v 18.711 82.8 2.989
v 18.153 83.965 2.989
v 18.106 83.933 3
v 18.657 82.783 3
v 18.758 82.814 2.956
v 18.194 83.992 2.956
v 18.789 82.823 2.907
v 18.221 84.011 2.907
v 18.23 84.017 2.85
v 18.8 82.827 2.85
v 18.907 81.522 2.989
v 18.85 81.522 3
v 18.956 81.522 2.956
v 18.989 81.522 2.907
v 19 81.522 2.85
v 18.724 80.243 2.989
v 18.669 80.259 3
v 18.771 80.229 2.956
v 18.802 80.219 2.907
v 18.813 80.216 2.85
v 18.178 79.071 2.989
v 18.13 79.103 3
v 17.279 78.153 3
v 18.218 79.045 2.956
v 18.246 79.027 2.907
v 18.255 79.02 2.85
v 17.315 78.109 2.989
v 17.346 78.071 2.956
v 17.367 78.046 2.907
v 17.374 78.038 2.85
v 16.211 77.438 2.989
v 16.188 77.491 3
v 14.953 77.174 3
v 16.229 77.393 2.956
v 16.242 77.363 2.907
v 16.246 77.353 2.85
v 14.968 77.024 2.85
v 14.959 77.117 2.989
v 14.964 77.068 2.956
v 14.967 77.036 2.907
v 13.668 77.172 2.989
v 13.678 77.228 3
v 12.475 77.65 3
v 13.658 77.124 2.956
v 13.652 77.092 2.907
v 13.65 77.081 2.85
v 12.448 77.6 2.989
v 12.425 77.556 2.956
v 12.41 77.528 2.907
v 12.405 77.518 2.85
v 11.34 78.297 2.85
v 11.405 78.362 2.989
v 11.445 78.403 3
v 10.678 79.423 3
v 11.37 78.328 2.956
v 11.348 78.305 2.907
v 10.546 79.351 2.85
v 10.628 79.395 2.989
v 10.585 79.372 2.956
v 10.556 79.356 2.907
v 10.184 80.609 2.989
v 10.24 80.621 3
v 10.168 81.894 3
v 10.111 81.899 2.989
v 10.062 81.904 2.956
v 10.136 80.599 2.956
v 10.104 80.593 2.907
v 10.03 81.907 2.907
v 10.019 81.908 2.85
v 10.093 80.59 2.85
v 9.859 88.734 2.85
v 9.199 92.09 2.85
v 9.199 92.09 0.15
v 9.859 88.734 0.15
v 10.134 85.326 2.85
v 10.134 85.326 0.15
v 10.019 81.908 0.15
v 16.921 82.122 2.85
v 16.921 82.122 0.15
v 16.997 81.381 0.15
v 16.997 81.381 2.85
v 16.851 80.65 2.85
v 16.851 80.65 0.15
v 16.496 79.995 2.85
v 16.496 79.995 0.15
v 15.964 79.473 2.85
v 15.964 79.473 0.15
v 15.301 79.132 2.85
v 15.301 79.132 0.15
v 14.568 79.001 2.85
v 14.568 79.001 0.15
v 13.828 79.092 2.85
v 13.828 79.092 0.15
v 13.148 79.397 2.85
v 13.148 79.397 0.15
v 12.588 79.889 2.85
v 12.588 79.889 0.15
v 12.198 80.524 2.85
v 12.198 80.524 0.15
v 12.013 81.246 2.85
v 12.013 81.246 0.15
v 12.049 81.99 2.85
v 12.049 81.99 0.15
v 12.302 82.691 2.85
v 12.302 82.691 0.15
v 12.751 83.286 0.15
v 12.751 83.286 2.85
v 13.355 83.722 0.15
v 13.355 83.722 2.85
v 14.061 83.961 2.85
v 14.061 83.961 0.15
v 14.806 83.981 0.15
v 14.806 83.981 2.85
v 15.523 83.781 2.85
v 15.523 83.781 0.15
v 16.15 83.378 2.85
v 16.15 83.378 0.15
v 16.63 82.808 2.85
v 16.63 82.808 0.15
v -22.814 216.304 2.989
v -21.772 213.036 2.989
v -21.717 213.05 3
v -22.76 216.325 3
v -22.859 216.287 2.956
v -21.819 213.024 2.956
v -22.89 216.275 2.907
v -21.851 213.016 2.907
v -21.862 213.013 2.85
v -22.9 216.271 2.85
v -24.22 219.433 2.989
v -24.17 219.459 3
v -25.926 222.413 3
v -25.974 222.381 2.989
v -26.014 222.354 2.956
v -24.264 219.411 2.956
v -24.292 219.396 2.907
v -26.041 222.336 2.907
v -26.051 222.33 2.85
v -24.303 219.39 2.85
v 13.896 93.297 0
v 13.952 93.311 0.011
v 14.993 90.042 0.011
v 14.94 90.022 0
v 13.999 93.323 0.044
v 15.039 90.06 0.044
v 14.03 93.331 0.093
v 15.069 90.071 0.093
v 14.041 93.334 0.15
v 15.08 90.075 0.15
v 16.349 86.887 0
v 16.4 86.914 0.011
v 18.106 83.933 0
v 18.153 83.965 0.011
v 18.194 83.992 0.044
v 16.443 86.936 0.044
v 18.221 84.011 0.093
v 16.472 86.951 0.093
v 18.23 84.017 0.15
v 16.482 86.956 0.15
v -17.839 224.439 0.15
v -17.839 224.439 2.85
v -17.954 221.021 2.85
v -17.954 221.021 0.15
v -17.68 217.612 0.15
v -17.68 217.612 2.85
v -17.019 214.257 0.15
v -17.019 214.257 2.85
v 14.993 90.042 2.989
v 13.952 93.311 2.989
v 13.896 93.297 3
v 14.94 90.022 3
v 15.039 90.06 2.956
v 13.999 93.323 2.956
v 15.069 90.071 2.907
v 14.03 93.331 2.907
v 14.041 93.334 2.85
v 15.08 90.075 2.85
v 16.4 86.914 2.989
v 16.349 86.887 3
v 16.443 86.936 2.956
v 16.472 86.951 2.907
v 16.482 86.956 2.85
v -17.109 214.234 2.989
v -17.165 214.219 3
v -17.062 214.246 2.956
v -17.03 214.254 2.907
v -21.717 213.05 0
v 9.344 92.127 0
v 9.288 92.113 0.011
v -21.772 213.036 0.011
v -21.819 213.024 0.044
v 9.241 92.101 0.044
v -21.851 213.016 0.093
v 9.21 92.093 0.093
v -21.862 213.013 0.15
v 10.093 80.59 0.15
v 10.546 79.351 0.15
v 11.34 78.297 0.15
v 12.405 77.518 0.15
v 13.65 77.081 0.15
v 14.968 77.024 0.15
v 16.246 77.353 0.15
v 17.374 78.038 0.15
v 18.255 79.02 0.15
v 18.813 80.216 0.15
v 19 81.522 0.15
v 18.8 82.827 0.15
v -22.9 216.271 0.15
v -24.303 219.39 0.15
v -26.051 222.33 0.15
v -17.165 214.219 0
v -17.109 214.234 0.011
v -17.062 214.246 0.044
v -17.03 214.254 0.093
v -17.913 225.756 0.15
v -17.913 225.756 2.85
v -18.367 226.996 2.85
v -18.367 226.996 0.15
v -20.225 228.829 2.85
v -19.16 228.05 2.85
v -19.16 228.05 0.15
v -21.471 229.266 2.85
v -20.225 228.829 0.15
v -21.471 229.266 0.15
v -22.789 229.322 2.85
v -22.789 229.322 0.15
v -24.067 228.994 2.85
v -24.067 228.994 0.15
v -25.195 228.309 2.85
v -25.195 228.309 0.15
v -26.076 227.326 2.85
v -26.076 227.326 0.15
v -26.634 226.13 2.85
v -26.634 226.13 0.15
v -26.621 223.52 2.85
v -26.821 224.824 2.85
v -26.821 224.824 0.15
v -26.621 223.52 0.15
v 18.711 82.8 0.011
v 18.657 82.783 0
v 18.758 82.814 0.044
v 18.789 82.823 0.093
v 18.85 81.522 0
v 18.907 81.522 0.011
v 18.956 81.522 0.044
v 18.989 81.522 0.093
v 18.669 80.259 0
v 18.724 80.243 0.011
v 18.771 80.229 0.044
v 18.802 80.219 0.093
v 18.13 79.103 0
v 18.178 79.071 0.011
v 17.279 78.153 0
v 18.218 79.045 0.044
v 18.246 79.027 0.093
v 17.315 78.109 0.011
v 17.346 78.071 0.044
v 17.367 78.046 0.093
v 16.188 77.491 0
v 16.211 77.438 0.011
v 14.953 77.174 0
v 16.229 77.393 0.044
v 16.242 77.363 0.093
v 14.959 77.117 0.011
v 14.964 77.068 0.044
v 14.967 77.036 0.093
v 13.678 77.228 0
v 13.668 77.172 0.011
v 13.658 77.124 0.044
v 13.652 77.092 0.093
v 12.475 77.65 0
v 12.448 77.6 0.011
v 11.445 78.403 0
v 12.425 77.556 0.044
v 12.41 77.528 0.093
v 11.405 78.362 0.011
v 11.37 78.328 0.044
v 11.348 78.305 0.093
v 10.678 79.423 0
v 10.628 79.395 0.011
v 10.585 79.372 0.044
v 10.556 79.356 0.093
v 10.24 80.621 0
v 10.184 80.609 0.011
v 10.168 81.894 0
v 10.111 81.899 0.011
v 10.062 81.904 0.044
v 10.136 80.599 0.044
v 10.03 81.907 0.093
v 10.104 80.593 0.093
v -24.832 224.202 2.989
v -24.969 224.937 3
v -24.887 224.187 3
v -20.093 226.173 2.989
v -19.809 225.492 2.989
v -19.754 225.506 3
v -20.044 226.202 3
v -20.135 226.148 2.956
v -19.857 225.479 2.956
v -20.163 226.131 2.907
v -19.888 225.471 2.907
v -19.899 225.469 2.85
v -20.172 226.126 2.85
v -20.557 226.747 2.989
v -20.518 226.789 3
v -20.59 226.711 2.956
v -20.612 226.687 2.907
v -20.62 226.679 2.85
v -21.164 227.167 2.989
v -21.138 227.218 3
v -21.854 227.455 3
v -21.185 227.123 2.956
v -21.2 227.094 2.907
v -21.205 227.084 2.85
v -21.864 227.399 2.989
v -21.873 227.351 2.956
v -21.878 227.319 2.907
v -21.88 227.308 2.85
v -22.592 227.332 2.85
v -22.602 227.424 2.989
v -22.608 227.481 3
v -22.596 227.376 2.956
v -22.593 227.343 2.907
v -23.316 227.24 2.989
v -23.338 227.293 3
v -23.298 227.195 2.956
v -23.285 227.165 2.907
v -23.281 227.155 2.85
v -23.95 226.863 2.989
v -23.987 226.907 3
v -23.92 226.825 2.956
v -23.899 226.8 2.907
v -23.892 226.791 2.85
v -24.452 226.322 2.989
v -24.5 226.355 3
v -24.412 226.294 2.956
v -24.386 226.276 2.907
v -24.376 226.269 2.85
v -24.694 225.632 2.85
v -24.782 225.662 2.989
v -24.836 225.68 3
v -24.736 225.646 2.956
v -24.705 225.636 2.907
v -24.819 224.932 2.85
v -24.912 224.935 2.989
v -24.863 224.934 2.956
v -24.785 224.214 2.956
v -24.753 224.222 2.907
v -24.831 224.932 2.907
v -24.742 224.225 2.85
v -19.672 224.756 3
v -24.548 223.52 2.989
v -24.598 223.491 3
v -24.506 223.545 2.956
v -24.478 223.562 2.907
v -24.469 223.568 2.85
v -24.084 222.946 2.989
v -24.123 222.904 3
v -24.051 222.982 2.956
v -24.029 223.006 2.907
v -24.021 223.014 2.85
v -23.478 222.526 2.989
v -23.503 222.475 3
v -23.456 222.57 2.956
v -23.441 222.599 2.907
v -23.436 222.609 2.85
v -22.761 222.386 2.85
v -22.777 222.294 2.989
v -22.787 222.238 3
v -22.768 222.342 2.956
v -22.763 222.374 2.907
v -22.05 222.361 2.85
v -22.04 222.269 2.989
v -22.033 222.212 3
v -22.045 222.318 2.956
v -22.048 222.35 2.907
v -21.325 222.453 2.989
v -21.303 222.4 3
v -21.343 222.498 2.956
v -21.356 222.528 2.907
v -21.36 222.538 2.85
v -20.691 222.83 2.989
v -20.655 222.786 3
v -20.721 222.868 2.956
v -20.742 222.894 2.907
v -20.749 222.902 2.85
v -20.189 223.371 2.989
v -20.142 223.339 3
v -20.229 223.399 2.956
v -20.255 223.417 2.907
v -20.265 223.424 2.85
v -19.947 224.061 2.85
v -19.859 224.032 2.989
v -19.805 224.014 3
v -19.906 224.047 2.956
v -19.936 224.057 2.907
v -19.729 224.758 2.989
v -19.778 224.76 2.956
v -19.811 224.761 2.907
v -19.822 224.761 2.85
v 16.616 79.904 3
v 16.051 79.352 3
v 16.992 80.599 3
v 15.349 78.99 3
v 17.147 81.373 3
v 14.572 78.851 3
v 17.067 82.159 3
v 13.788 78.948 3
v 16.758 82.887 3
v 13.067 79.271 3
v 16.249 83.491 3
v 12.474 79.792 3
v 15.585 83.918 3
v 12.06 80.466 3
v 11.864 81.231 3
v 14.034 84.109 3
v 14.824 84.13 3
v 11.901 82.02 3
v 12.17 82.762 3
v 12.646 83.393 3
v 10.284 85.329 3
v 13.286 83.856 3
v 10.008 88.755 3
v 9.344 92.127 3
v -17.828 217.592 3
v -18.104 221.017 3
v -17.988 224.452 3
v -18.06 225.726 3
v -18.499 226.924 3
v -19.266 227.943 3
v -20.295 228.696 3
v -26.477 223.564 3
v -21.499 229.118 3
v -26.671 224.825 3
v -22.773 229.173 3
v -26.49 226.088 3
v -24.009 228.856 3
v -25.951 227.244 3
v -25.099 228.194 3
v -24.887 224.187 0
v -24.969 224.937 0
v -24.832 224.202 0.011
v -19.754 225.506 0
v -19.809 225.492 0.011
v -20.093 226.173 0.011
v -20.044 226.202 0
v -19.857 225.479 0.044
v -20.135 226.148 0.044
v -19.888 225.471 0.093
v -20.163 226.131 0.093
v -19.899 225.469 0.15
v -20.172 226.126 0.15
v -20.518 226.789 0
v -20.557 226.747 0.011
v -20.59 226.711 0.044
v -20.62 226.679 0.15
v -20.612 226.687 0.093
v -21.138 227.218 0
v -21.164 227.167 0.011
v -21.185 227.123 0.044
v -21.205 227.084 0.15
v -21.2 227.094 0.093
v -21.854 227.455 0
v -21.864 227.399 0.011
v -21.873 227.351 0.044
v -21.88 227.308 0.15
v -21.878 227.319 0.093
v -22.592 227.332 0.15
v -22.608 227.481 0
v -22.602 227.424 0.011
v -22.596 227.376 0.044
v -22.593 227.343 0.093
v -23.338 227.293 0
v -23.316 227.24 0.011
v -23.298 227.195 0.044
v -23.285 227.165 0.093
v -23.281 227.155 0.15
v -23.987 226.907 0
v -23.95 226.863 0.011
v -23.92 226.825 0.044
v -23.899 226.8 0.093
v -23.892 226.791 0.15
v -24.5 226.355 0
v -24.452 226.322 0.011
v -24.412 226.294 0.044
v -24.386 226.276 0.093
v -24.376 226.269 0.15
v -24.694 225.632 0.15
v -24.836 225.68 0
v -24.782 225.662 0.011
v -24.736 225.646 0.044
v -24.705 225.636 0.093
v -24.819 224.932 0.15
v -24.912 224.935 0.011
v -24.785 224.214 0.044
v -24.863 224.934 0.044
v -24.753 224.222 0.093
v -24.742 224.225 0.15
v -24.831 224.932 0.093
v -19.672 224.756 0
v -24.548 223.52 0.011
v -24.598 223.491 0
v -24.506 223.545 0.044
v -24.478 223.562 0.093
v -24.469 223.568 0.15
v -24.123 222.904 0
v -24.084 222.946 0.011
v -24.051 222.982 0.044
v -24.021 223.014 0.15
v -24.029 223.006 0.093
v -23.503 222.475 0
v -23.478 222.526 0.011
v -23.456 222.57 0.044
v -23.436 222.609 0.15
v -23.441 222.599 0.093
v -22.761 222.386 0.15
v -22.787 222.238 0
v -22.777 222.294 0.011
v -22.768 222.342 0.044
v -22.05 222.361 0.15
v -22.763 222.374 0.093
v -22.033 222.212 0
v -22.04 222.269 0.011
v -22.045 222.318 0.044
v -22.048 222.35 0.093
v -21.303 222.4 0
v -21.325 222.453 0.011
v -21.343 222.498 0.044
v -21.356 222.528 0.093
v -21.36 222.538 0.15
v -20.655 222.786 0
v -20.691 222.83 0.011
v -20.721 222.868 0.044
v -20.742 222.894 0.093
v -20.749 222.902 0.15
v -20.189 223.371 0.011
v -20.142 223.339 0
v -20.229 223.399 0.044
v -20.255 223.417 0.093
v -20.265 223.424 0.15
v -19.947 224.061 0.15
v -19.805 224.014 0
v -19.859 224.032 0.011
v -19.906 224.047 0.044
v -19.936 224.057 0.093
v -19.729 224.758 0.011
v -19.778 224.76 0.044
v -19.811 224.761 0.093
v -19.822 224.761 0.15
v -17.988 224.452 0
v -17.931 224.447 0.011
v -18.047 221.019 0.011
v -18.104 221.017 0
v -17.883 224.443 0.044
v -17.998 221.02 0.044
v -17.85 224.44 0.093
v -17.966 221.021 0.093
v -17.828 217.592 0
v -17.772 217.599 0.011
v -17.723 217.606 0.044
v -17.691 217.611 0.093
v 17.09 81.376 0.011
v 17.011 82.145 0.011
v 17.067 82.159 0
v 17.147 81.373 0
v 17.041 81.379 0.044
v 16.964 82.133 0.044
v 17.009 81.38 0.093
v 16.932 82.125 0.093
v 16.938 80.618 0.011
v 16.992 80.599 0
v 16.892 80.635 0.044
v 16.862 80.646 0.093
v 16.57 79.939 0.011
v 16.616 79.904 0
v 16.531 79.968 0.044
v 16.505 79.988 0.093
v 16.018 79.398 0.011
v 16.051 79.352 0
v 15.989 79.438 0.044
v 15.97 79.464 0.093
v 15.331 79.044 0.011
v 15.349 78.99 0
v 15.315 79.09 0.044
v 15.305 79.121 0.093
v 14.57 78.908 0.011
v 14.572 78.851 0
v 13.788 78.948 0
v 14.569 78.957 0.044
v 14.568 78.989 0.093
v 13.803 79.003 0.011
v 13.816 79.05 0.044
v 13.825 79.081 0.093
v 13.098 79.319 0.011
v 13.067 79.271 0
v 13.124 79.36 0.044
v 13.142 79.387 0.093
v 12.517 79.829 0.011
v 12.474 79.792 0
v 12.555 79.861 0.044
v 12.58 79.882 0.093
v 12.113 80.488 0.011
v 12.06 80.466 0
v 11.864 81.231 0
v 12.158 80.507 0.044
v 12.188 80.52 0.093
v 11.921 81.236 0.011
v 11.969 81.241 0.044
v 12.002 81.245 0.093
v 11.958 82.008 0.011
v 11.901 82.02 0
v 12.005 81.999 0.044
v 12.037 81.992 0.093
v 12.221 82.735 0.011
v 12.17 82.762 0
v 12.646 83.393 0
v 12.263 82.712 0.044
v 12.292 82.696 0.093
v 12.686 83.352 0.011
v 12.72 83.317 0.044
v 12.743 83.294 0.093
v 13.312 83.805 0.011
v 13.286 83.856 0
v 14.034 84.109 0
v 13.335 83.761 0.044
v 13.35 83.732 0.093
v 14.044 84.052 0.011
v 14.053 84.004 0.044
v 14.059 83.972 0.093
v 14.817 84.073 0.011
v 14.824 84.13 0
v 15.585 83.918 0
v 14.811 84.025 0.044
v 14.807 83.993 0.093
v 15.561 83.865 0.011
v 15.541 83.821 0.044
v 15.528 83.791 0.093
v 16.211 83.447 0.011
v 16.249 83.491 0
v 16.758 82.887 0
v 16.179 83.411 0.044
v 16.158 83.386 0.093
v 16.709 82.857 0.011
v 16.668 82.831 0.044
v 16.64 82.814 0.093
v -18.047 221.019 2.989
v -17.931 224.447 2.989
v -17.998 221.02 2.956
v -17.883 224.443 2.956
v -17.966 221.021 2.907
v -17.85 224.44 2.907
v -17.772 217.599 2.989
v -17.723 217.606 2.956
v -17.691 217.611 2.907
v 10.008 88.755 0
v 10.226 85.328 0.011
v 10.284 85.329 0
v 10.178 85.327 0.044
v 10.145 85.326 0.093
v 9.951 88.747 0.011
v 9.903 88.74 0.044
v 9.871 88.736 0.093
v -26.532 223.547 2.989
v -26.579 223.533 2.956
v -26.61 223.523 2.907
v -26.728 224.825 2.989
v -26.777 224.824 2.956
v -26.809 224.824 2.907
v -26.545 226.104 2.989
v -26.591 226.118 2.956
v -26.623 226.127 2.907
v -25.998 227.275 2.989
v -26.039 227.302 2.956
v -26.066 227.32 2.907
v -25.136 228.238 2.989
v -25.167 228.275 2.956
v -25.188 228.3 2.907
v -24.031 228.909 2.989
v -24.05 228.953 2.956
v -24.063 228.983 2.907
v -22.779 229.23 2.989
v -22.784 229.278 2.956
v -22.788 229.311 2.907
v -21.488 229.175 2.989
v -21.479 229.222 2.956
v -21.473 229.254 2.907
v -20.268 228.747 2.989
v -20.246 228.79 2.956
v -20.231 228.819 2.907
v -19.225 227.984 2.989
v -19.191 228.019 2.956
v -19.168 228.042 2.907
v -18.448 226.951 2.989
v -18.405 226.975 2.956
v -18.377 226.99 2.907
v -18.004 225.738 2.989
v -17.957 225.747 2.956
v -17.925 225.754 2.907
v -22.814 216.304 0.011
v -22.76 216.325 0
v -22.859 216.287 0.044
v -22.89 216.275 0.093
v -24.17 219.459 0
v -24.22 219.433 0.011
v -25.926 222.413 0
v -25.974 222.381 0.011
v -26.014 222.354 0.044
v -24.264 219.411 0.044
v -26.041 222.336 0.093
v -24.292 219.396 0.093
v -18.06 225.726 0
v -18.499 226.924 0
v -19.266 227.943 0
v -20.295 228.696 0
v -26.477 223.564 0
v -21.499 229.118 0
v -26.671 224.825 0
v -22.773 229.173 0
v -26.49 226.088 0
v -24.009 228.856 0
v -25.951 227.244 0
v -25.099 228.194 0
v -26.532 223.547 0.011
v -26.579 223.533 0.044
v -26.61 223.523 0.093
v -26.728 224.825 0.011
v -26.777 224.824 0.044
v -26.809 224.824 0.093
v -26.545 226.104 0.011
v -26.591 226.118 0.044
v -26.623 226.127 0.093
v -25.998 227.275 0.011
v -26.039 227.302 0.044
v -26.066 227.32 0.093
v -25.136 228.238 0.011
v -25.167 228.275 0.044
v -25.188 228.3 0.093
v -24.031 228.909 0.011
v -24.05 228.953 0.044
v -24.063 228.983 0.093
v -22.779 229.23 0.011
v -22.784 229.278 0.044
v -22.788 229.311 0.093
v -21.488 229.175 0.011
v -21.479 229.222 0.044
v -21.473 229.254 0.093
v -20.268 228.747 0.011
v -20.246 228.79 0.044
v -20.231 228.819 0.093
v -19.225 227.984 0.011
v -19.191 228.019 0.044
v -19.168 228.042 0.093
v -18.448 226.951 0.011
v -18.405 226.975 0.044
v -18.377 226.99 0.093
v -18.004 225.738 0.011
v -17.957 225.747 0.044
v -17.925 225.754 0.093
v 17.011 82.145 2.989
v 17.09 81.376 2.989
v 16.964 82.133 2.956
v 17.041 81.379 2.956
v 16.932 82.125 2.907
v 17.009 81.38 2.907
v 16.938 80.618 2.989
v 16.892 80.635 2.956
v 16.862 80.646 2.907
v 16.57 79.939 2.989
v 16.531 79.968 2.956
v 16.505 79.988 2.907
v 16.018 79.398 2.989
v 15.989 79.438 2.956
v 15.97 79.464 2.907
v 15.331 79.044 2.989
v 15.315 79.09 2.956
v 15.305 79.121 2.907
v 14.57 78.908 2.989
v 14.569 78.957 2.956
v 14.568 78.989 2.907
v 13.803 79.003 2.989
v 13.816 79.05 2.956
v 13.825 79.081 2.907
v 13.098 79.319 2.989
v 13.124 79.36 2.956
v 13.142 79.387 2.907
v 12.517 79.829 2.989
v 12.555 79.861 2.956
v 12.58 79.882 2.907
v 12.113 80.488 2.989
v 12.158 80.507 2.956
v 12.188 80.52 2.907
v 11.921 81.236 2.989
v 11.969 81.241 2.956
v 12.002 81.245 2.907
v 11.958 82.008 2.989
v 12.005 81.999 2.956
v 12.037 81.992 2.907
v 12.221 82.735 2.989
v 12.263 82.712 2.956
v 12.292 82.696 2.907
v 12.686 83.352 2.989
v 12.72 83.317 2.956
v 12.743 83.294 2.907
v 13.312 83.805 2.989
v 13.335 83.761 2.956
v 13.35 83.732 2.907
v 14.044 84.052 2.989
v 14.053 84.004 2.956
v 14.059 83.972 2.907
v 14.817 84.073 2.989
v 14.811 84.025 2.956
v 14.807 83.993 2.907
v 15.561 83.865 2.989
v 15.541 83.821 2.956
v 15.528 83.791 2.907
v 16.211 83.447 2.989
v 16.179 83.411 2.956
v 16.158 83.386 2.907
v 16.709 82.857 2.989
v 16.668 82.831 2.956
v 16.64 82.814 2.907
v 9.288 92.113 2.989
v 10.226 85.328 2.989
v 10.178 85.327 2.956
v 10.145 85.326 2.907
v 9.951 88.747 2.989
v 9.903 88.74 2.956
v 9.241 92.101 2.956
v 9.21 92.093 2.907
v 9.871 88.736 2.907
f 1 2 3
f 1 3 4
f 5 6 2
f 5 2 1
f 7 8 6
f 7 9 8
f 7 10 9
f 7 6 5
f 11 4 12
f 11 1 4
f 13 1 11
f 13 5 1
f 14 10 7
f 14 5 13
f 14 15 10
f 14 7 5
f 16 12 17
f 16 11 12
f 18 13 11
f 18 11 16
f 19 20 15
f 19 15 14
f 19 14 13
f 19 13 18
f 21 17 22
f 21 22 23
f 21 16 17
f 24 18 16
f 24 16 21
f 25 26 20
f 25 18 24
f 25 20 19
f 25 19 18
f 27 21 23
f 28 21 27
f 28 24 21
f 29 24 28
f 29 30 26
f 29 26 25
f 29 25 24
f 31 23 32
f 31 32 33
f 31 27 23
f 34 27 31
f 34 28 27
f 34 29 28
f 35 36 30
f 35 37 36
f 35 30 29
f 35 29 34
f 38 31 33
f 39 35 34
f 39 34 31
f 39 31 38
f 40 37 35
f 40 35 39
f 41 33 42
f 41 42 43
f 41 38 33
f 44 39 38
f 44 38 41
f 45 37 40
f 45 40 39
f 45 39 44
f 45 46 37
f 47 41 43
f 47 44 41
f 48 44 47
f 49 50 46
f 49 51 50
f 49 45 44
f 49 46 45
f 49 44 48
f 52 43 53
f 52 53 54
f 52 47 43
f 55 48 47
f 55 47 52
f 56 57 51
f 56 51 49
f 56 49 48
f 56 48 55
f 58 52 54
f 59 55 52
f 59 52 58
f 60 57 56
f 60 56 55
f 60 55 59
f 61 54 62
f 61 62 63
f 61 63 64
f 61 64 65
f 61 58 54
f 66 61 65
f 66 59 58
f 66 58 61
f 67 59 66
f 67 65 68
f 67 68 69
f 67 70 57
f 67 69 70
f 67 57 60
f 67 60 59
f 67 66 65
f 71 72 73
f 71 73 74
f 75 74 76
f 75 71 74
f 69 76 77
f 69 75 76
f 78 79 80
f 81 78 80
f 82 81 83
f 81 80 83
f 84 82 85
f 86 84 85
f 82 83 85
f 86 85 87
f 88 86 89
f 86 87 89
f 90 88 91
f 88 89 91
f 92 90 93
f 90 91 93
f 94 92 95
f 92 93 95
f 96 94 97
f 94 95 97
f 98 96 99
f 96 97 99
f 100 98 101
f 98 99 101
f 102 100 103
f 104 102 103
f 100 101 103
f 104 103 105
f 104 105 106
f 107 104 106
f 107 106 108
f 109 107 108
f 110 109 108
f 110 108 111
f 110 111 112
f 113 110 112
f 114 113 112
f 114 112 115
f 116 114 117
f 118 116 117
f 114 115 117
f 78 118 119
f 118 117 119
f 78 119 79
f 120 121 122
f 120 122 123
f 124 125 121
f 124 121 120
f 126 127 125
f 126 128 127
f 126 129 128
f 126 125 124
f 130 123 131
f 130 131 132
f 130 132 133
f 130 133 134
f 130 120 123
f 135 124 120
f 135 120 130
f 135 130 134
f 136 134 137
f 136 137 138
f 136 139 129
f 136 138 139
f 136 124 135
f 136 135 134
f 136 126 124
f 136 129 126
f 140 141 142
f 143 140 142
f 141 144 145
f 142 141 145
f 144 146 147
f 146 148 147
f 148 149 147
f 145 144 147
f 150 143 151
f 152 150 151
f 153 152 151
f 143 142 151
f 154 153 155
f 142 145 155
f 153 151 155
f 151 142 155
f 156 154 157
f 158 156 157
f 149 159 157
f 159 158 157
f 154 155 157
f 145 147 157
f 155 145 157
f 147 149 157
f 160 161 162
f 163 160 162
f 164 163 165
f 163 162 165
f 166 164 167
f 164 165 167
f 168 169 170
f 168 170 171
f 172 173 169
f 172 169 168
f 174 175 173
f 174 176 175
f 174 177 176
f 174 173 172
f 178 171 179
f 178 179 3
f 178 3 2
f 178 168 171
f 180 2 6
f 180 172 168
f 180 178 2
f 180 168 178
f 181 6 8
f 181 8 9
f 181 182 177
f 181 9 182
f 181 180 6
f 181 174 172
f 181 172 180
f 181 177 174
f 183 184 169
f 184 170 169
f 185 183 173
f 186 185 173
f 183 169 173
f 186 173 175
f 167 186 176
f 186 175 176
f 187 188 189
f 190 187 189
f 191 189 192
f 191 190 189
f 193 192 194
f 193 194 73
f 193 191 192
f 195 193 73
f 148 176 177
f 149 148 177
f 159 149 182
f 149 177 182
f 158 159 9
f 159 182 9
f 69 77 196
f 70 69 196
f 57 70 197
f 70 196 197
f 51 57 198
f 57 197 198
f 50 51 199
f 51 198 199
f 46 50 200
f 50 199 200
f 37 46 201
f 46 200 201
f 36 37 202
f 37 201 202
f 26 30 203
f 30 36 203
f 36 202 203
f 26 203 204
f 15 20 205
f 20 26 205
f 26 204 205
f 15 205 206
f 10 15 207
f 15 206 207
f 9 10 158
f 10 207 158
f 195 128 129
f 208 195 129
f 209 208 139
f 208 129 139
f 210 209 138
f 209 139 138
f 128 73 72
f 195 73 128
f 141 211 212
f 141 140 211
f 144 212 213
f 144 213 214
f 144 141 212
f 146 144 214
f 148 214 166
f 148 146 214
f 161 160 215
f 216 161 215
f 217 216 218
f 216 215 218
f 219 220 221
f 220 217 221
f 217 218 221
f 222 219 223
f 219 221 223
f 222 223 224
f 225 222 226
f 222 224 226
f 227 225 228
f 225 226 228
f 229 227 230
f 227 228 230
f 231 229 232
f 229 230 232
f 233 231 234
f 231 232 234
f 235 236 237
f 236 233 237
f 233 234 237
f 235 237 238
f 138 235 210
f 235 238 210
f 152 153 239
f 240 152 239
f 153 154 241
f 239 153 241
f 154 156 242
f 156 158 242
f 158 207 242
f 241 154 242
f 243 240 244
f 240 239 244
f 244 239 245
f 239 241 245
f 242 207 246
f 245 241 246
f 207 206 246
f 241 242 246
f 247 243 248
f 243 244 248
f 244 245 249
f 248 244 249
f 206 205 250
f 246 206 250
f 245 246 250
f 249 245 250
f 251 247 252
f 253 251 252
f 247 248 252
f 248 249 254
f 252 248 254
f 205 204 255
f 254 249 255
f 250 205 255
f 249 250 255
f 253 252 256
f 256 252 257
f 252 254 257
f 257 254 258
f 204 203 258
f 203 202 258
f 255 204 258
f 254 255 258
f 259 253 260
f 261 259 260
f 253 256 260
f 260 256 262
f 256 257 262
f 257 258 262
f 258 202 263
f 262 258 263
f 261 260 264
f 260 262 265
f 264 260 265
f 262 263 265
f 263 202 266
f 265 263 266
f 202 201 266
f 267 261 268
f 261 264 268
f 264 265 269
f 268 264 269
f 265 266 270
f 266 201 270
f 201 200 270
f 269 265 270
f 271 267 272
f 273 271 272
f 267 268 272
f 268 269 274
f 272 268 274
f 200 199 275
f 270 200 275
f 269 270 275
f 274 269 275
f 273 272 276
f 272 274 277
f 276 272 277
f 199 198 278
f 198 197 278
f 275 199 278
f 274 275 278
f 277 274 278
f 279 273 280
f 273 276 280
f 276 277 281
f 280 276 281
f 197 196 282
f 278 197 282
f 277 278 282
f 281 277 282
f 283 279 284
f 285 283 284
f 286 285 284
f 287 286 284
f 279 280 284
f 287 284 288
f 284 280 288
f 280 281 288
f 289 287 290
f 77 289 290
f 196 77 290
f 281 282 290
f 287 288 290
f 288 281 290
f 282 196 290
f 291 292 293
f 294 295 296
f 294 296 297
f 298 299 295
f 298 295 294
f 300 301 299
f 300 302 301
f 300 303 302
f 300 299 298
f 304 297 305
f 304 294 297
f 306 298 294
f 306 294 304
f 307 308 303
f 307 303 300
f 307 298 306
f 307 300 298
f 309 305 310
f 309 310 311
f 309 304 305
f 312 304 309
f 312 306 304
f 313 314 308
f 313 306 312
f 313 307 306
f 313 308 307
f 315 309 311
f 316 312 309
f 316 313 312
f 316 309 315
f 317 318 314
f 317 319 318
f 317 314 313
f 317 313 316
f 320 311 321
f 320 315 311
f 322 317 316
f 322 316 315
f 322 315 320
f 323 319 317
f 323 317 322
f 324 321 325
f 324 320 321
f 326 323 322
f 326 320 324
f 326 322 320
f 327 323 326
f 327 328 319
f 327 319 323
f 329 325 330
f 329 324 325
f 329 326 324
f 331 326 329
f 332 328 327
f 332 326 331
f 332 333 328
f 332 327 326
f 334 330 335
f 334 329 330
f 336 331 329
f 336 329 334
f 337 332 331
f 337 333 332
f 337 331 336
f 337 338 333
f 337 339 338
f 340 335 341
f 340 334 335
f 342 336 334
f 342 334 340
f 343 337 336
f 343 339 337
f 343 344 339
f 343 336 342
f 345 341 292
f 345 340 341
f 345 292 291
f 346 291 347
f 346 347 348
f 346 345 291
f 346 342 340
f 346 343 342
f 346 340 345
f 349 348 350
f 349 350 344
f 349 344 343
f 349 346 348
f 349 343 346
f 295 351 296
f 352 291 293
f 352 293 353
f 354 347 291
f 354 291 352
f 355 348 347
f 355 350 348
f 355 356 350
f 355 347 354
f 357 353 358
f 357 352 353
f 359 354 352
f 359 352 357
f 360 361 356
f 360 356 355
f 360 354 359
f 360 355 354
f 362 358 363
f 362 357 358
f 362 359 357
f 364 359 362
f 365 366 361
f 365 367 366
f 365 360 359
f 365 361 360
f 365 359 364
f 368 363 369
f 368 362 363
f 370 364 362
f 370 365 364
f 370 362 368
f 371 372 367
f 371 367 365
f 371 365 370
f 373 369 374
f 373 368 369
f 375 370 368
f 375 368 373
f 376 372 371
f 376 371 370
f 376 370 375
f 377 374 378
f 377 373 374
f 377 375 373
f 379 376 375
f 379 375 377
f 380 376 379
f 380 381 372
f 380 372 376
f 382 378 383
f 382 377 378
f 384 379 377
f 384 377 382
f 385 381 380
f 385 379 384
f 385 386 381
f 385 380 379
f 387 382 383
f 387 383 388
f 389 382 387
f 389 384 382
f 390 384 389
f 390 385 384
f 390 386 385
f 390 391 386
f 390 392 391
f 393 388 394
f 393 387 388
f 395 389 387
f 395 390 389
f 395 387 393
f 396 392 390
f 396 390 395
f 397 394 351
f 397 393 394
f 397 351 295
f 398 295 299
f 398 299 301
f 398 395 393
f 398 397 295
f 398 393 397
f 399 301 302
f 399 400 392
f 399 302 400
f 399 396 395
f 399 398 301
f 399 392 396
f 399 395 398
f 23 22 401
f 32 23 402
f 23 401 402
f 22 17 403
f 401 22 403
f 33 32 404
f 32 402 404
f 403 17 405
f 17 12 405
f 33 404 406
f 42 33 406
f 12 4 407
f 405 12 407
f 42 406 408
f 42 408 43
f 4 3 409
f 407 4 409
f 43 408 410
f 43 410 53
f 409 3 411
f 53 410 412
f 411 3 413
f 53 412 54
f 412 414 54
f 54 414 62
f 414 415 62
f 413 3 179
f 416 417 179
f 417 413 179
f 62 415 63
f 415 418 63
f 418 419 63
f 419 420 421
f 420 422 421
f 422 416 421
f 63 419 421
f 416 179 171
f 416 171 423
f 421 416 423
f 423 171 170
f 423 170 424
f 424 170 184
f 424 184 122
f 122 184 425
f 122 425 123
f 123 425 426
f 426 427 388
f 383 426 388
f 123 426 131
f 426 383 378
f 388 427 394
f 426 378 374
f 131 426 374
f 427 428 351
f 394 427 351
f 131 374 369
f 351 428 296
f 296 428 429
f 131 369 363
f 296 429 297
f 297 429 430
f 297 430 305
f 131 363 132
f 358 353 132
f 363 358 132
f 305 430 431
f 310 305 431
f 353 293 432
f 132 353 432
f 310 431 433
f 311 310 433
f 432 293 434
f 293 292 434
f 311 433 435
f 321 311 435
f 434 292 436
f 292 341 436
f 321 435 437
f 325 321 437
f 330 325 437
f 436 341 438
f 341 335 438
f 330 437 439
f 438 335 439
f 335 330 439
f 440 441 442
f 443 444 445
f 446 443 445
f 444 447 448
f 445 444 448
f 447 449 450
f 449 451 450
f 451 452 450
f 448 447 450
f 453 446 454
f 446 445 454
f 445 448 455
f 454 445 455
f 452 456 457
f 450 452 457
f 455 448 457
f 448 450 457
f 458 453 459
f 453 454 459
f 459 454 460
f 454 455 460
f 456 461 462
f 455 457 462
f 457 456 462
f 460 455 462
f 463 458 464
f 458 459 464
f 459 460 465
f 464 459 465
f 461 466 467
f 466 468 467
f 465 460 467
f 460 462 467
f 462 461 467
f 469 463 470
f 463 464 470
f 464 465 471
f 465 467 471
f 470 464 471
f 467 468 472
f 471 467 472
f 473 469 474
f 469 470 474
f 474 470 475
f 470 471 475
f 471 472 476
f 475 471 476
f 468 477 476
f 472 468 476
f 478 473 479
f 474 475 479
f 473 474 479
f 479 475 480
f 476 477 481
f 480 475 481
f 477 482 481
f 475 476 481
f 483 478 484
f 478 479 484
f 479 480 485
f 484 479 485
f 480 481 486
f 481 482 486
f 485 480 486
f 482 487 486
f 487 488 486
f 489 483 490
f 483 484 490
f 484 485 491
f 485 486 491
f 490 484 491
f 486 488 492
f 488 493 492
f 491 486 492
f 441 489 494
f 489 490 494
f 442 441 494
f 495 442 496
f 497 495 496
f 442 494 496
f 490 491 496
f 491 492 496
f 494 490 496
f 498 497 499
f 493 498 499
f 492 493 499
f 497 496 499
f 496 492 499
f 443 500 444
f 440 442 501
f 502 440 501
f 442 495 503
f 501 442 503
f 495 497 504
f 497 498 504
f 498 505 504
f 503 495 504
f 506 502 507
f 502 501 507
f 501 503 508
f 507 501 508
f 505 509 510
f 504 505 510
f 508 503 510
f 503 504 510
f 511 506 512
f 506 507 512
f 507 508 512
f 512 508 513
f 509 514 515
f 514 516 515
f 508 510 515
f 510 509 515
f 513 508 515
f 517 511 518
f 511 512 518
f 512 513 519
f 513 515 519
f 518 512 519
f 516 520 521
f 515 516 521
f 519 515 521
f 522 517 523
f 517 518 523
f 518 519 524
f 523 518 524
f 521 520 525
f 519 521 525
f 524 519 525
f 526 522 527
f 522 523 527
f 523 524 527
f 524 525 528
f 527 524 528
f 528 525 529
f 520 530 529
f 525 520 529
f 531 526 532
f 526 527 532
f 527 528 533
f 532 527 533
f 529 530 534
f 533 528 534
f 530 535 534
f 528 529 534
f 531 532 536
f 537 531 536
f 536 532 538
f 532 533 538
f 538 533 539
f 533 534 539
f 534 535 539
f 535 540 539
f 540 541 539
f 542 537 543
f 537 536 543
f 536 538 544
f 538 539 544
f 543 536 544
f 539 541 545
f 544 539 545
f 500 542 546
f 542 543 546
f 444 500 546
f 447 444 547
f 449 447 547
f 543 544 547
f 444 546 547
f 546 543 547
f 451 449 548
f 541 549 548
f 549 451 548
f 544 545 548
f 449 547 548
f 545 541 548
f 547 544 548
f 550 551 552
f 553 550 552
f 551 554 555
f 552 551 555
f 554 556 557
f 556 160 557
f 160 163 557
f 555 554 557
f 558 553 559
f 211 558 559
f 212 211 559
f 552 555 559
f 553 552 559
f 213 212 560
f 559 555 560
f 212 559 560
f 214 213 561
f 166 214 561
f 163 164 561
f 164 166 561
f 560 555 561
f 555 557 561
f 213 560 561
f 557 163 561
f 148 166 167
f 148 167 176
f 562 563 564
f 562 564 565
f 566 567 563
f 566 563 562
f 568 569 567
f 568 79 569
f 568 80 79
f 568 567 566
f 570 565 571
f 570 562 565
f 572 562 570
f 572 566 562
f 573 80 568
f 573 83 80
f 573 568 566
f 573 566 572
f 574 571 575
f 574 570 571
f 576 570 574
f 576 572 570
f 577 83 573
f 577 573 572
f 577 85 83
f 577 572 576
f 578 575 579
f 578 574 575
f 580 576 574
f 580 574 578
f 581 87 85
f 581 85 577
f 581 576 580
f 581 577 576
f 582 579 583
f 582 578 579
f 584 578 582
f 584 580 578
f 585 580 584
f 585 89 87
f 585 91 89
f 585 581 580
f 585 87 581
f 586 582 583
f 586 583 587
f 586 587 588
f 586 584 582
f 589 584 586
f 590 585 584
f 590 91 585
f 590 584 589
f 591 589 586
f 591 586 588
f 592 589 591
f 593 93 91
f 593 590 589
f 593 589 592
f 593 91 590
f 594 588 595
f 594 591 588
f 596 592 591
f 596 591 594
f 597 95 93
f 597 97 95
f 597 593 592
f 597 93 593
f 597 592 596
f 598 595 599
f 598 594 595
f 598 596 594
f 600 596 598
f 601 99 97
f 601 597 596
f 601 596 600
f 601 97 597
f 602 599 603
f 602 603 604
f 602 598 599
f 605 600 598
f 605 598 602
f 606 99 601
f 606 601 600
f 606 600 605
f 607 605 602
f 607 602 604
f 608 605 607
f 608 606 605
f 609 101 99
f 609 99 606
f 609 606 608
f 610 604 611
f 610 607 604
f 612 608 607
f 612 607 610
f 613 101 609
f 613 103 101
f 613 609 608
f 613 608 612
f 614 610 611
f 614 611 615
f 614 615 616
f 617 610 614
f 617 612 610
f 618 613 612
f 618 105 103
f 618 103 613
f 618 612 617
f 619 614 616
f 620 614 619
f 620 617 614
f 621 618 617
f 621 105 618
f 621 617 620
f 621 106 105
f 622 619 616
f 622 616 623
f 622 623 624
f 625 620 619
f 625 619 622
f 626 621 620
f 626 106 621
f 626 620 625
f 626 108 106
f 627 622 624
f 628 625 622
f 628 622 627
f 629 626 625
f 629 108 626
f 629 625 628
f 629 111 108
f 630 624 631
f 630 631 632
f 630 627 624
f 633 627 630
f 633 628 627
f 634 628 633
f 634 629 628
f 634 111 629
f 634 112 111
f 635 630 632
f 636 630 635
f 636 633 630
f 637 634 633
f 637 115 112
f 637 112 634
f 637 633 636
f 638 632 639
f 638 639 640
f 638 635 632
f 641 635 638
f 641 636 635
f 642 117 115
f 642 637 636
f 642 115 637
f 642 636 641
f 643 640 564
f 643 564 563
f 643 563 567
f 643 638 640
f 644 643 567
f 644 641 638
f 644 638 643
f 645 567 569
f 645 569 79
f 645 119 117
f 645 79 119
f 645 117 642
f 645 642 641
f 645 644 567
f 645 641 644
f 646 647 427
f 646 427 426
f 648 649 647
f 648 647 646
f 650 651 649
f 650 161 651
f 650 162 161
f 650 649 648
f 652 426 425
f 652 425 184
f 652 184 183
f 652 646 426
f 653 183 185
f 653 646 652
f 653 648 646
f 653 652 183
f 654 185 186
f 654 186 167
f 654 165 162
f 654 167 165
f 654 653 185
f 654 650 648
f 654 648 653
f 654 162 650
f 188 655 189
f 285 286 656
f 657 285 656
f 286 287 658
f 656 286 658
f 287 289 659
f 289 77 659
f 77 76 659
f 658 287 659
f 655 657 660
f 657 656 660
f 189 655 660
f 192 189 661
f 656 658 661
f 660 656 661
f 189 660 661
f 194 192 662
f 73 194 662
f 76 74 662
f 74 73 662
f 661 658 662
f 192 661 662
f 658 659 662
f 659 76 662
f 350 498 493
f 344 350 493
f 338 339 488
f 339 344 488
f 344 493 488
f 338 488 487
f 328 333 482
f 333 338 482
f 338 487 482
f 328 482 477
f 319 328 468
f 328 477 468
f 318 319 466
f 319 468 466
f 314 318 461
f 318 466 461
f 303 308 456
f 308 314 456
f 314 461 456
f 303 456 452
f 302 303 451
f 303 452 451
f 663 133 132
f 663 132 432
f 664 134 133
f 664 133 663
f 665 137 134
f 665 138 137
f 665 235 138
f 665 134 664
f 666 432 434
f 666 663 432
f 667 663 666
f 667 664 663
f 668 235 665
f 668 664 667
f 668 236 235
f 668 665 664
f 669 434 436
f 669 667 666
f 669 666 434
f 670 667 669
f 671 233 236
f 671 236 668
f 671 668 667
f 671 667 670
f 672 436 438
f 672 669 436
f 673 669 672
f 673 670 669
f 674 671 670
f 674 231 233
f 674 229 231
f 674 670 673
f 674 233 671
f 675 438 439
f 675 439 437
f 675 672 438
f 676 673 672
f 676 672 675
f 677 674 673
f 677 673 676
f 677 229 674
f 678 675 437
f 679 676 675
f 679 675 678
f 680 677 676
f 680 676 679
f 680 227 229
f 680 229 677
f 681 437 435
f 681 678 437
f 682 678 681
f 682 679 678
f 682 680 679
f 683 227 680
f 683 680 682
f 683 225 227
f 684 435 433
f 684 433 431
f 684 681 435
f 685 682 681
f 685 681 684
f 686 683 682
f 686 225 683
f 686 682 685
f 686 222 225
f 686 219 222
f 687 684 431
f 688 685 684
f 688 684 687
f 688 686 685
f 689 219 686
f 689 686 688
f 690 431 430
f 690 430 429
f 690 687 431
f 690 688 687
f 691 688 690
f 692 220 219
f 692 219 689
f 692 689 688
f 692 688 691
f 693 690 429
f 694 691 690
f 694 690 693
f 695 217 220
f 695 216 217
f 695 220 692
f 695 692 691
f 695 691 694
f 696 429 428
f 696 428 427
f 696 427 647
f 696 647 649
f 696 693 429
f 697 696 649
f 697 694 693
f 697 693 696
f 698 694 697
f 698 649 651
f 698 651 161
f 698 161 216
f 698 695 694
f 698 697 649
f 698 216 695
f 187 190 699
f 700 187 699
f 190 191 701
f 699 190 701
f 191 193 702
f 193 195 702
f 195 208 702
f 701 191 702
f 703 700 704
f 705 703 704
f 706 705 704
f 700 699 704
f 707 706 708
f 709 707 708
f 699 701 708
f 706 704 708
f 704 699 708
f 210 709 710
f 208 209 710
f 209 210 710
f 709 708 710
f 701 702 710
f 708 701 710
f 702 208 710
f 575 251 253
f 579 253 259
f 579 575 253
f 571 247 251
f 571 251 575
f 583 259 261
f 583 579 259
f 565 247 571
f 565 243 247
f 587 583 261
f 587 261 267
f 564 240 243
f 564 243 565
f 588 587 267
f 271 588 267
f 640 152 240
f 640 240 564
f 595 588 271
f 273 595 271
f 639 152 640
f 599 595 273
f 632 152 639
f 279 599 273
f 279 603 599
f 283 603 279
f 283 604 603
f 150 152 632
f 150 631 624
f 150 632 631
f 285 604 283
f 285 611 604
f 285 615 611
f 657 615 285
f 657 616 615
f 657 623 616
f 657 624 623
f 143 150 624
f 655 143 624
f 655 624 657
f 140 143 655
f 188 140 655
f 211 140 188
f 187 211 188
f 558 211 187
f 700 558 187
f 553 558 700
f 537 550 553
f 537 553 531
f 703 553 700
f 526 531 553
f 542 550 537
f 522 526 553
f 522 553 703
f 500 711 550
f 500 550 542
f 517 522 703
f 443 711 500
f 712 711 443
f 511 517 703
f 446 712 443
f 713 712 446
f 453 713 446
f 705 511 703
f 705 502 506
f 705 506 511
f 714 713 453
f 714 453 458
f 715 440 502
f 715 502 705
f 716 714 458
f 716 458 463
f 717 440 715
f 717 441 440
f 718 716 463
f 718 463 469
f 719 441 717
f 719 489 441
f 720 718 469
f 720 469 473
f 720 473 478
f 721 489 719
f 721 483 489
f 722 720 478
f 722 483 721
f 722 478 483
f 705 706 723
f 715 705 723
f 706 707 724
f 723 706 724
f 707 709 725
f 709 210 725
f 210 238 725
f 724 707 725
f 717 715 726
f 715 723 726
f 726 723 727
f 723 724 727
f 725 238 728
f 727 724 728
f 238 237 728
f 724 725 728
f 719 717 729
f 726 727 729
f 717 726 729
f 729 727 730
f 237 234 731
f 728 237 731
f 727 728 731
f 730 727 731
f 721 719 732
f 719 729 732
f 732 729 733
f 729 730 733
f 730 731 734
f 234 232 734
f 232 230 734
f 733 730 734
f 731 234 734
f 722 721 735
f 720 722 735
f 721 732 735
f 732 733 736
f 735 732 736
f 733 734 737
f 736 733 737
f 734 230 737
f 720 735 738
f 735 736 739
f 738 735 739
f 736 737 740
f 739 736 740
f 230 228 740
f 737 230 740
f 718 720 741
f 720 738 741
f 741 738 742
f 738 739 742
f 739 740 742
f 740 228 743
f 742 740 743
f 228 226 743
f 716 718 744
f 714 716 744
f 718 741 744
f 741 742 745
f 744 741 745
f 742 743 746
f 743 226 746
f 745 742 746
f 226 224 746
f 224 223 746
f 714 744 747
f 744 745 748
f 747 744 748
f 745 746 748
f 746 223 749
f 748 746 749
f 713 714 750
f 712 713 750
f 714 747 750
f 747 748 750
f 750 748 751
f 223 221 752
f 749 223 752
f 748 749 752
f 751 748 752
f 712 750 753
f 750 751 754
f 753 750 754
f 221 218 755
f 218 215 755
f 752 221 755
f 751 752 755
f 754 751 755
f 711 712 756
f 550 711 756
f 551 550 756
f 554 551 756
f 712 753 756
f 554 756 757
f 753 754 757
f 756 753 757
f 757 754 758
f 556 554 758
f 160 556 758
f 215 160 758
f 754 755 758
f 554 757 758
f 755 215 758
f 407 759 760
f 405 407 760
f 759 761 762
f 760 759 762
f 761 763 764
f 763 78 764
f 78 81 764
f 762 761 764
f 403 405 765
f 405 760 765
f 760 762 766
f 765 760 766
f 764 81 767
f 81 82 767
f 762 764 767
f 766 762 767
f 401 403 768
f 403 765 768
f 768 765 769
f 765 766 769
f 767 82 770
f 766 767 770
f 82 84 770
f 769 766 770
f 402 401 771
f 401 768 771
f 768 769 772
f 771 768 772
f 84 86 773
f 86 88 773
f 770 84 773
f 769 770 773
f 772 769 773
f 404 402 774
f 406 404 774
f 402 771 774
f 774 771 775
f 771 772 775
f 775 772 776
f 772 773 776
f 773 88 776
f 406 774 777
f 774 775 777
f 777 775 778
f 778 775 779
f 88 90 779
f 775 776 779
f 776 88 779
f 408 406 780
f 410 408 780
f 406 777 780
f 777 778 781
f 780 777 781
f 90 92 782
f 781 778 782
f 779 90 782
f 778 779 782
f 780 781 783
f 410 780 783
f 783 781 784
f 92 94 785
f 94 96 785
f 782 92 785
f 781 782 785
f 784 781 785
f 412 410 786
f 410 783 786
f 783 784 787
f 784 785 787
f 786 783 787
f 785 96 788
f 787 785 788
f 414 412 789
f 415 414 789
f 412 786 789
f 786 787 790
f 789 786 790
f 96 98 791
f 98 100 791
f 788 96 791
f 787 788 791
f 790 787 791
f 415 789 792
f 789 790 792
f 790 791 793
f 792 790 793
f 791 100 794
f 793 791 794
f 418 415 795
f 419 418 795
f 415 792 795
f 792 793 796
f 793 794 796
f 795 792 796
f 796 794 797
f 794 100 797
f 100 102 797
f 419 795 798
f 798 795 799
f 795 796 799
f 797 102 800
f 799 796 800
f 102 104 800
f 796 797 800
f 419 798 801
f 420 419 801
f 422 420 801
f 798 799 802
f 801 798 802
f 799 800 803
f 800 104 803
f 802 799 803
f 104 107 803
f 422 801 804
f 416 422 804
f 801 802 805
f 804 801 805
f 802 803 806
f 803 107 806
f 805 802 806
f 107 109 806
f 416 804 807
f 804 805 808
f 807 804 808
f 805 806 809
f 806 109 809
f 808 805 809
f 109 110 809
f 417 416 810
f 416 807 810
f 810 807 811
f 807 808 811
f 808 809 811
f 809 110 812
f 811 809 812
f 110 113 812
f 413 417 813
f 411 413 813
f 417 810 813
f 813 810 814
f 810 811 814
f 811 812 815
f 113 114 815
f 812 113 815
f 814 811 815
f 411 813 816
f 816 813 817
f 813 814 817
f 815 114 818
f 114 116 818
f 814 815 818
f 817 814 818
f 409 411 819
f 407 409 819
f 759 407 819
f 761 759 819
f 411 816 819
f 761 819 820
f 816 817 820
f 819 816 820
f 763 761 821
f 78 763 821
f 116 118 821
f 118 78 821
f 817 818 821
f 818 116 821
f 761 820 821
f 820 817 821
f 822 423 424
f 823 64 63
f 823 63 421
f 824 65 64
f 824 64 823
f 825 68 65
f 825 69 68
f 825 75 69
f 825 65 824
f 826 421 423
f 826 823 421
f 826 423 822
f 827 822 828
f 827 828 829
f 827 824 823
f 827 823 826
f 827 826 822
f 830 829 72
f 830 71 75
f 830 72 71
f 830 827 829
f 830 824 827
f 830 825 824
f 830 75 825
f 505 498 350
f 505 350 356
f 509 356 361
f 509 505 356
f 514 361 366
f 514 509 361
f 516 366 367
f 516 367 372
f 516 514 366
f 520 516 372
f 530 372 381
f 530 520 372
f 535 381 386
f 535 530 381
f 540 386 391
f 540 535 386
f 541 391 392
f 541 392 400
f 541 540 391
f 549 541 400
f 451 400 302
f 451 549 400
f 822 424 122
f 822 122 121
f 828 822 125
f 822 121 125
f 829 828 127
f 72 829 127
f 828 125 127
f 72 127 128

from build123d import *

# Parameters (mm, degrees)
BOSS_EXTRUDE1_DEPTH = 3
FILLET1_R           = 30
FILLET2_R           = 0.15


with BuildPart() as part:
    # Sketch1 → Boss-Extrude1 (new body)
    with BuildSketch(Plane.XY):
        with BuildLine():
            ThreePointArc((16.921395106, 82.121969245), (13.878030755, 83.921395106), (12.078604894, 80.878030755))
            Line((12.078604894, 80.878030755), (-24.741974394, 224.224621021))
            ThreePointArc((-24.741974394, 224.224621021), (-21.698610044, 222.42519516), (-19.899184183, 225.468559511))
            Line((-19.899184183, 225.468559511), (16.921395106, 82.121969245))
        make_face()
        with BuildLine():
            ThreePointArc((-24.741974394, 224.224621021), (-22.942548533, 227.267985372), (-19.899184183, 225.468559511))
            Line((-19.899184183, 225.468559511), (-18.968305855, 221.844547157))
            ThreePointArc((-18.968305855, 221.844547157), (-23.440123929, 229.205101456), (-23.811096067, 220.600608668))
            Line((-23.811096067, 220.600608668), (-24.741974394, 224.224621021))
        make_face()
        with BuildLine():
            ThreePointArc((11.147726567, 84.502043109), (15.619544641, 77.141488809), (15.990516778, 85.745981598))
            Line((15.990516778, 85.745981598), (16.921395106, 82.121969245))
            ThreePointArc((16.921395106, 82.121969245), (15.121969245, 79.078604894), (12.078604894, 80.878030755))
            Line((12.078604894, 80.878030755), (11.147726567, 84.502043109))
        make_face()
    extrude(amount=BOSS_EXTRUDE1_DEPTH)

    # Fillet1
    fillet1_edges = [part.edges().sort_by_distance(p)[0] for p in [
        (15.990516778, 85.745981598, 1.5),
        (11.147726567, 84.502043109, 1.5),
        (-23.811096067, 220.600608668, 1.5),
        (-18.968305855, 221.844547157, 1.5),
    ]]
    fillet(fillet1_edges, radius=FILLET1_R)

    # Fillet2
    fillet2_edges = [part.edges().sort_by_distance(p)[0] for p in [
        (-1.488894538, 153.795264378, 0),
        (-1.488894538, 153.795264378, 3),
        (15.619544641, 77.141488809, 0),
        (15.619544641, 77.141488809, 3),
        (12.078604894, 80.878030755, 3),
        (-6.33168475, 152.551325888, 0),
        (-6.33168475, 152.551325888, 3),
        (-23.440123929, 229.205101456, 0),
        (-23.440123929, 229.205101456, 3),
        (15.73637098, 88.495854984, 0),
        (15.73637098, 88.495854984, 3),
        (10.045163223, 87.033988566, 0),
        (10.045163223, 87.033988566, 3),
        (-23.556950269, 217.850735282, 0),
        (-19.899184183, 225.468559511, 3),
        (-23.556950269, 217.850735282, 3),
        (-17.865742511, 219.3126017, 0),
        (-17.865742511, 219.3126017, 3),
        (-19.899184183, 225.468559511, 0),
        (12.078604894, 80.878030755, 0),
    ]]
    fillet(fillet2_edges, radius=FILLET2_R)


solid = part.part
